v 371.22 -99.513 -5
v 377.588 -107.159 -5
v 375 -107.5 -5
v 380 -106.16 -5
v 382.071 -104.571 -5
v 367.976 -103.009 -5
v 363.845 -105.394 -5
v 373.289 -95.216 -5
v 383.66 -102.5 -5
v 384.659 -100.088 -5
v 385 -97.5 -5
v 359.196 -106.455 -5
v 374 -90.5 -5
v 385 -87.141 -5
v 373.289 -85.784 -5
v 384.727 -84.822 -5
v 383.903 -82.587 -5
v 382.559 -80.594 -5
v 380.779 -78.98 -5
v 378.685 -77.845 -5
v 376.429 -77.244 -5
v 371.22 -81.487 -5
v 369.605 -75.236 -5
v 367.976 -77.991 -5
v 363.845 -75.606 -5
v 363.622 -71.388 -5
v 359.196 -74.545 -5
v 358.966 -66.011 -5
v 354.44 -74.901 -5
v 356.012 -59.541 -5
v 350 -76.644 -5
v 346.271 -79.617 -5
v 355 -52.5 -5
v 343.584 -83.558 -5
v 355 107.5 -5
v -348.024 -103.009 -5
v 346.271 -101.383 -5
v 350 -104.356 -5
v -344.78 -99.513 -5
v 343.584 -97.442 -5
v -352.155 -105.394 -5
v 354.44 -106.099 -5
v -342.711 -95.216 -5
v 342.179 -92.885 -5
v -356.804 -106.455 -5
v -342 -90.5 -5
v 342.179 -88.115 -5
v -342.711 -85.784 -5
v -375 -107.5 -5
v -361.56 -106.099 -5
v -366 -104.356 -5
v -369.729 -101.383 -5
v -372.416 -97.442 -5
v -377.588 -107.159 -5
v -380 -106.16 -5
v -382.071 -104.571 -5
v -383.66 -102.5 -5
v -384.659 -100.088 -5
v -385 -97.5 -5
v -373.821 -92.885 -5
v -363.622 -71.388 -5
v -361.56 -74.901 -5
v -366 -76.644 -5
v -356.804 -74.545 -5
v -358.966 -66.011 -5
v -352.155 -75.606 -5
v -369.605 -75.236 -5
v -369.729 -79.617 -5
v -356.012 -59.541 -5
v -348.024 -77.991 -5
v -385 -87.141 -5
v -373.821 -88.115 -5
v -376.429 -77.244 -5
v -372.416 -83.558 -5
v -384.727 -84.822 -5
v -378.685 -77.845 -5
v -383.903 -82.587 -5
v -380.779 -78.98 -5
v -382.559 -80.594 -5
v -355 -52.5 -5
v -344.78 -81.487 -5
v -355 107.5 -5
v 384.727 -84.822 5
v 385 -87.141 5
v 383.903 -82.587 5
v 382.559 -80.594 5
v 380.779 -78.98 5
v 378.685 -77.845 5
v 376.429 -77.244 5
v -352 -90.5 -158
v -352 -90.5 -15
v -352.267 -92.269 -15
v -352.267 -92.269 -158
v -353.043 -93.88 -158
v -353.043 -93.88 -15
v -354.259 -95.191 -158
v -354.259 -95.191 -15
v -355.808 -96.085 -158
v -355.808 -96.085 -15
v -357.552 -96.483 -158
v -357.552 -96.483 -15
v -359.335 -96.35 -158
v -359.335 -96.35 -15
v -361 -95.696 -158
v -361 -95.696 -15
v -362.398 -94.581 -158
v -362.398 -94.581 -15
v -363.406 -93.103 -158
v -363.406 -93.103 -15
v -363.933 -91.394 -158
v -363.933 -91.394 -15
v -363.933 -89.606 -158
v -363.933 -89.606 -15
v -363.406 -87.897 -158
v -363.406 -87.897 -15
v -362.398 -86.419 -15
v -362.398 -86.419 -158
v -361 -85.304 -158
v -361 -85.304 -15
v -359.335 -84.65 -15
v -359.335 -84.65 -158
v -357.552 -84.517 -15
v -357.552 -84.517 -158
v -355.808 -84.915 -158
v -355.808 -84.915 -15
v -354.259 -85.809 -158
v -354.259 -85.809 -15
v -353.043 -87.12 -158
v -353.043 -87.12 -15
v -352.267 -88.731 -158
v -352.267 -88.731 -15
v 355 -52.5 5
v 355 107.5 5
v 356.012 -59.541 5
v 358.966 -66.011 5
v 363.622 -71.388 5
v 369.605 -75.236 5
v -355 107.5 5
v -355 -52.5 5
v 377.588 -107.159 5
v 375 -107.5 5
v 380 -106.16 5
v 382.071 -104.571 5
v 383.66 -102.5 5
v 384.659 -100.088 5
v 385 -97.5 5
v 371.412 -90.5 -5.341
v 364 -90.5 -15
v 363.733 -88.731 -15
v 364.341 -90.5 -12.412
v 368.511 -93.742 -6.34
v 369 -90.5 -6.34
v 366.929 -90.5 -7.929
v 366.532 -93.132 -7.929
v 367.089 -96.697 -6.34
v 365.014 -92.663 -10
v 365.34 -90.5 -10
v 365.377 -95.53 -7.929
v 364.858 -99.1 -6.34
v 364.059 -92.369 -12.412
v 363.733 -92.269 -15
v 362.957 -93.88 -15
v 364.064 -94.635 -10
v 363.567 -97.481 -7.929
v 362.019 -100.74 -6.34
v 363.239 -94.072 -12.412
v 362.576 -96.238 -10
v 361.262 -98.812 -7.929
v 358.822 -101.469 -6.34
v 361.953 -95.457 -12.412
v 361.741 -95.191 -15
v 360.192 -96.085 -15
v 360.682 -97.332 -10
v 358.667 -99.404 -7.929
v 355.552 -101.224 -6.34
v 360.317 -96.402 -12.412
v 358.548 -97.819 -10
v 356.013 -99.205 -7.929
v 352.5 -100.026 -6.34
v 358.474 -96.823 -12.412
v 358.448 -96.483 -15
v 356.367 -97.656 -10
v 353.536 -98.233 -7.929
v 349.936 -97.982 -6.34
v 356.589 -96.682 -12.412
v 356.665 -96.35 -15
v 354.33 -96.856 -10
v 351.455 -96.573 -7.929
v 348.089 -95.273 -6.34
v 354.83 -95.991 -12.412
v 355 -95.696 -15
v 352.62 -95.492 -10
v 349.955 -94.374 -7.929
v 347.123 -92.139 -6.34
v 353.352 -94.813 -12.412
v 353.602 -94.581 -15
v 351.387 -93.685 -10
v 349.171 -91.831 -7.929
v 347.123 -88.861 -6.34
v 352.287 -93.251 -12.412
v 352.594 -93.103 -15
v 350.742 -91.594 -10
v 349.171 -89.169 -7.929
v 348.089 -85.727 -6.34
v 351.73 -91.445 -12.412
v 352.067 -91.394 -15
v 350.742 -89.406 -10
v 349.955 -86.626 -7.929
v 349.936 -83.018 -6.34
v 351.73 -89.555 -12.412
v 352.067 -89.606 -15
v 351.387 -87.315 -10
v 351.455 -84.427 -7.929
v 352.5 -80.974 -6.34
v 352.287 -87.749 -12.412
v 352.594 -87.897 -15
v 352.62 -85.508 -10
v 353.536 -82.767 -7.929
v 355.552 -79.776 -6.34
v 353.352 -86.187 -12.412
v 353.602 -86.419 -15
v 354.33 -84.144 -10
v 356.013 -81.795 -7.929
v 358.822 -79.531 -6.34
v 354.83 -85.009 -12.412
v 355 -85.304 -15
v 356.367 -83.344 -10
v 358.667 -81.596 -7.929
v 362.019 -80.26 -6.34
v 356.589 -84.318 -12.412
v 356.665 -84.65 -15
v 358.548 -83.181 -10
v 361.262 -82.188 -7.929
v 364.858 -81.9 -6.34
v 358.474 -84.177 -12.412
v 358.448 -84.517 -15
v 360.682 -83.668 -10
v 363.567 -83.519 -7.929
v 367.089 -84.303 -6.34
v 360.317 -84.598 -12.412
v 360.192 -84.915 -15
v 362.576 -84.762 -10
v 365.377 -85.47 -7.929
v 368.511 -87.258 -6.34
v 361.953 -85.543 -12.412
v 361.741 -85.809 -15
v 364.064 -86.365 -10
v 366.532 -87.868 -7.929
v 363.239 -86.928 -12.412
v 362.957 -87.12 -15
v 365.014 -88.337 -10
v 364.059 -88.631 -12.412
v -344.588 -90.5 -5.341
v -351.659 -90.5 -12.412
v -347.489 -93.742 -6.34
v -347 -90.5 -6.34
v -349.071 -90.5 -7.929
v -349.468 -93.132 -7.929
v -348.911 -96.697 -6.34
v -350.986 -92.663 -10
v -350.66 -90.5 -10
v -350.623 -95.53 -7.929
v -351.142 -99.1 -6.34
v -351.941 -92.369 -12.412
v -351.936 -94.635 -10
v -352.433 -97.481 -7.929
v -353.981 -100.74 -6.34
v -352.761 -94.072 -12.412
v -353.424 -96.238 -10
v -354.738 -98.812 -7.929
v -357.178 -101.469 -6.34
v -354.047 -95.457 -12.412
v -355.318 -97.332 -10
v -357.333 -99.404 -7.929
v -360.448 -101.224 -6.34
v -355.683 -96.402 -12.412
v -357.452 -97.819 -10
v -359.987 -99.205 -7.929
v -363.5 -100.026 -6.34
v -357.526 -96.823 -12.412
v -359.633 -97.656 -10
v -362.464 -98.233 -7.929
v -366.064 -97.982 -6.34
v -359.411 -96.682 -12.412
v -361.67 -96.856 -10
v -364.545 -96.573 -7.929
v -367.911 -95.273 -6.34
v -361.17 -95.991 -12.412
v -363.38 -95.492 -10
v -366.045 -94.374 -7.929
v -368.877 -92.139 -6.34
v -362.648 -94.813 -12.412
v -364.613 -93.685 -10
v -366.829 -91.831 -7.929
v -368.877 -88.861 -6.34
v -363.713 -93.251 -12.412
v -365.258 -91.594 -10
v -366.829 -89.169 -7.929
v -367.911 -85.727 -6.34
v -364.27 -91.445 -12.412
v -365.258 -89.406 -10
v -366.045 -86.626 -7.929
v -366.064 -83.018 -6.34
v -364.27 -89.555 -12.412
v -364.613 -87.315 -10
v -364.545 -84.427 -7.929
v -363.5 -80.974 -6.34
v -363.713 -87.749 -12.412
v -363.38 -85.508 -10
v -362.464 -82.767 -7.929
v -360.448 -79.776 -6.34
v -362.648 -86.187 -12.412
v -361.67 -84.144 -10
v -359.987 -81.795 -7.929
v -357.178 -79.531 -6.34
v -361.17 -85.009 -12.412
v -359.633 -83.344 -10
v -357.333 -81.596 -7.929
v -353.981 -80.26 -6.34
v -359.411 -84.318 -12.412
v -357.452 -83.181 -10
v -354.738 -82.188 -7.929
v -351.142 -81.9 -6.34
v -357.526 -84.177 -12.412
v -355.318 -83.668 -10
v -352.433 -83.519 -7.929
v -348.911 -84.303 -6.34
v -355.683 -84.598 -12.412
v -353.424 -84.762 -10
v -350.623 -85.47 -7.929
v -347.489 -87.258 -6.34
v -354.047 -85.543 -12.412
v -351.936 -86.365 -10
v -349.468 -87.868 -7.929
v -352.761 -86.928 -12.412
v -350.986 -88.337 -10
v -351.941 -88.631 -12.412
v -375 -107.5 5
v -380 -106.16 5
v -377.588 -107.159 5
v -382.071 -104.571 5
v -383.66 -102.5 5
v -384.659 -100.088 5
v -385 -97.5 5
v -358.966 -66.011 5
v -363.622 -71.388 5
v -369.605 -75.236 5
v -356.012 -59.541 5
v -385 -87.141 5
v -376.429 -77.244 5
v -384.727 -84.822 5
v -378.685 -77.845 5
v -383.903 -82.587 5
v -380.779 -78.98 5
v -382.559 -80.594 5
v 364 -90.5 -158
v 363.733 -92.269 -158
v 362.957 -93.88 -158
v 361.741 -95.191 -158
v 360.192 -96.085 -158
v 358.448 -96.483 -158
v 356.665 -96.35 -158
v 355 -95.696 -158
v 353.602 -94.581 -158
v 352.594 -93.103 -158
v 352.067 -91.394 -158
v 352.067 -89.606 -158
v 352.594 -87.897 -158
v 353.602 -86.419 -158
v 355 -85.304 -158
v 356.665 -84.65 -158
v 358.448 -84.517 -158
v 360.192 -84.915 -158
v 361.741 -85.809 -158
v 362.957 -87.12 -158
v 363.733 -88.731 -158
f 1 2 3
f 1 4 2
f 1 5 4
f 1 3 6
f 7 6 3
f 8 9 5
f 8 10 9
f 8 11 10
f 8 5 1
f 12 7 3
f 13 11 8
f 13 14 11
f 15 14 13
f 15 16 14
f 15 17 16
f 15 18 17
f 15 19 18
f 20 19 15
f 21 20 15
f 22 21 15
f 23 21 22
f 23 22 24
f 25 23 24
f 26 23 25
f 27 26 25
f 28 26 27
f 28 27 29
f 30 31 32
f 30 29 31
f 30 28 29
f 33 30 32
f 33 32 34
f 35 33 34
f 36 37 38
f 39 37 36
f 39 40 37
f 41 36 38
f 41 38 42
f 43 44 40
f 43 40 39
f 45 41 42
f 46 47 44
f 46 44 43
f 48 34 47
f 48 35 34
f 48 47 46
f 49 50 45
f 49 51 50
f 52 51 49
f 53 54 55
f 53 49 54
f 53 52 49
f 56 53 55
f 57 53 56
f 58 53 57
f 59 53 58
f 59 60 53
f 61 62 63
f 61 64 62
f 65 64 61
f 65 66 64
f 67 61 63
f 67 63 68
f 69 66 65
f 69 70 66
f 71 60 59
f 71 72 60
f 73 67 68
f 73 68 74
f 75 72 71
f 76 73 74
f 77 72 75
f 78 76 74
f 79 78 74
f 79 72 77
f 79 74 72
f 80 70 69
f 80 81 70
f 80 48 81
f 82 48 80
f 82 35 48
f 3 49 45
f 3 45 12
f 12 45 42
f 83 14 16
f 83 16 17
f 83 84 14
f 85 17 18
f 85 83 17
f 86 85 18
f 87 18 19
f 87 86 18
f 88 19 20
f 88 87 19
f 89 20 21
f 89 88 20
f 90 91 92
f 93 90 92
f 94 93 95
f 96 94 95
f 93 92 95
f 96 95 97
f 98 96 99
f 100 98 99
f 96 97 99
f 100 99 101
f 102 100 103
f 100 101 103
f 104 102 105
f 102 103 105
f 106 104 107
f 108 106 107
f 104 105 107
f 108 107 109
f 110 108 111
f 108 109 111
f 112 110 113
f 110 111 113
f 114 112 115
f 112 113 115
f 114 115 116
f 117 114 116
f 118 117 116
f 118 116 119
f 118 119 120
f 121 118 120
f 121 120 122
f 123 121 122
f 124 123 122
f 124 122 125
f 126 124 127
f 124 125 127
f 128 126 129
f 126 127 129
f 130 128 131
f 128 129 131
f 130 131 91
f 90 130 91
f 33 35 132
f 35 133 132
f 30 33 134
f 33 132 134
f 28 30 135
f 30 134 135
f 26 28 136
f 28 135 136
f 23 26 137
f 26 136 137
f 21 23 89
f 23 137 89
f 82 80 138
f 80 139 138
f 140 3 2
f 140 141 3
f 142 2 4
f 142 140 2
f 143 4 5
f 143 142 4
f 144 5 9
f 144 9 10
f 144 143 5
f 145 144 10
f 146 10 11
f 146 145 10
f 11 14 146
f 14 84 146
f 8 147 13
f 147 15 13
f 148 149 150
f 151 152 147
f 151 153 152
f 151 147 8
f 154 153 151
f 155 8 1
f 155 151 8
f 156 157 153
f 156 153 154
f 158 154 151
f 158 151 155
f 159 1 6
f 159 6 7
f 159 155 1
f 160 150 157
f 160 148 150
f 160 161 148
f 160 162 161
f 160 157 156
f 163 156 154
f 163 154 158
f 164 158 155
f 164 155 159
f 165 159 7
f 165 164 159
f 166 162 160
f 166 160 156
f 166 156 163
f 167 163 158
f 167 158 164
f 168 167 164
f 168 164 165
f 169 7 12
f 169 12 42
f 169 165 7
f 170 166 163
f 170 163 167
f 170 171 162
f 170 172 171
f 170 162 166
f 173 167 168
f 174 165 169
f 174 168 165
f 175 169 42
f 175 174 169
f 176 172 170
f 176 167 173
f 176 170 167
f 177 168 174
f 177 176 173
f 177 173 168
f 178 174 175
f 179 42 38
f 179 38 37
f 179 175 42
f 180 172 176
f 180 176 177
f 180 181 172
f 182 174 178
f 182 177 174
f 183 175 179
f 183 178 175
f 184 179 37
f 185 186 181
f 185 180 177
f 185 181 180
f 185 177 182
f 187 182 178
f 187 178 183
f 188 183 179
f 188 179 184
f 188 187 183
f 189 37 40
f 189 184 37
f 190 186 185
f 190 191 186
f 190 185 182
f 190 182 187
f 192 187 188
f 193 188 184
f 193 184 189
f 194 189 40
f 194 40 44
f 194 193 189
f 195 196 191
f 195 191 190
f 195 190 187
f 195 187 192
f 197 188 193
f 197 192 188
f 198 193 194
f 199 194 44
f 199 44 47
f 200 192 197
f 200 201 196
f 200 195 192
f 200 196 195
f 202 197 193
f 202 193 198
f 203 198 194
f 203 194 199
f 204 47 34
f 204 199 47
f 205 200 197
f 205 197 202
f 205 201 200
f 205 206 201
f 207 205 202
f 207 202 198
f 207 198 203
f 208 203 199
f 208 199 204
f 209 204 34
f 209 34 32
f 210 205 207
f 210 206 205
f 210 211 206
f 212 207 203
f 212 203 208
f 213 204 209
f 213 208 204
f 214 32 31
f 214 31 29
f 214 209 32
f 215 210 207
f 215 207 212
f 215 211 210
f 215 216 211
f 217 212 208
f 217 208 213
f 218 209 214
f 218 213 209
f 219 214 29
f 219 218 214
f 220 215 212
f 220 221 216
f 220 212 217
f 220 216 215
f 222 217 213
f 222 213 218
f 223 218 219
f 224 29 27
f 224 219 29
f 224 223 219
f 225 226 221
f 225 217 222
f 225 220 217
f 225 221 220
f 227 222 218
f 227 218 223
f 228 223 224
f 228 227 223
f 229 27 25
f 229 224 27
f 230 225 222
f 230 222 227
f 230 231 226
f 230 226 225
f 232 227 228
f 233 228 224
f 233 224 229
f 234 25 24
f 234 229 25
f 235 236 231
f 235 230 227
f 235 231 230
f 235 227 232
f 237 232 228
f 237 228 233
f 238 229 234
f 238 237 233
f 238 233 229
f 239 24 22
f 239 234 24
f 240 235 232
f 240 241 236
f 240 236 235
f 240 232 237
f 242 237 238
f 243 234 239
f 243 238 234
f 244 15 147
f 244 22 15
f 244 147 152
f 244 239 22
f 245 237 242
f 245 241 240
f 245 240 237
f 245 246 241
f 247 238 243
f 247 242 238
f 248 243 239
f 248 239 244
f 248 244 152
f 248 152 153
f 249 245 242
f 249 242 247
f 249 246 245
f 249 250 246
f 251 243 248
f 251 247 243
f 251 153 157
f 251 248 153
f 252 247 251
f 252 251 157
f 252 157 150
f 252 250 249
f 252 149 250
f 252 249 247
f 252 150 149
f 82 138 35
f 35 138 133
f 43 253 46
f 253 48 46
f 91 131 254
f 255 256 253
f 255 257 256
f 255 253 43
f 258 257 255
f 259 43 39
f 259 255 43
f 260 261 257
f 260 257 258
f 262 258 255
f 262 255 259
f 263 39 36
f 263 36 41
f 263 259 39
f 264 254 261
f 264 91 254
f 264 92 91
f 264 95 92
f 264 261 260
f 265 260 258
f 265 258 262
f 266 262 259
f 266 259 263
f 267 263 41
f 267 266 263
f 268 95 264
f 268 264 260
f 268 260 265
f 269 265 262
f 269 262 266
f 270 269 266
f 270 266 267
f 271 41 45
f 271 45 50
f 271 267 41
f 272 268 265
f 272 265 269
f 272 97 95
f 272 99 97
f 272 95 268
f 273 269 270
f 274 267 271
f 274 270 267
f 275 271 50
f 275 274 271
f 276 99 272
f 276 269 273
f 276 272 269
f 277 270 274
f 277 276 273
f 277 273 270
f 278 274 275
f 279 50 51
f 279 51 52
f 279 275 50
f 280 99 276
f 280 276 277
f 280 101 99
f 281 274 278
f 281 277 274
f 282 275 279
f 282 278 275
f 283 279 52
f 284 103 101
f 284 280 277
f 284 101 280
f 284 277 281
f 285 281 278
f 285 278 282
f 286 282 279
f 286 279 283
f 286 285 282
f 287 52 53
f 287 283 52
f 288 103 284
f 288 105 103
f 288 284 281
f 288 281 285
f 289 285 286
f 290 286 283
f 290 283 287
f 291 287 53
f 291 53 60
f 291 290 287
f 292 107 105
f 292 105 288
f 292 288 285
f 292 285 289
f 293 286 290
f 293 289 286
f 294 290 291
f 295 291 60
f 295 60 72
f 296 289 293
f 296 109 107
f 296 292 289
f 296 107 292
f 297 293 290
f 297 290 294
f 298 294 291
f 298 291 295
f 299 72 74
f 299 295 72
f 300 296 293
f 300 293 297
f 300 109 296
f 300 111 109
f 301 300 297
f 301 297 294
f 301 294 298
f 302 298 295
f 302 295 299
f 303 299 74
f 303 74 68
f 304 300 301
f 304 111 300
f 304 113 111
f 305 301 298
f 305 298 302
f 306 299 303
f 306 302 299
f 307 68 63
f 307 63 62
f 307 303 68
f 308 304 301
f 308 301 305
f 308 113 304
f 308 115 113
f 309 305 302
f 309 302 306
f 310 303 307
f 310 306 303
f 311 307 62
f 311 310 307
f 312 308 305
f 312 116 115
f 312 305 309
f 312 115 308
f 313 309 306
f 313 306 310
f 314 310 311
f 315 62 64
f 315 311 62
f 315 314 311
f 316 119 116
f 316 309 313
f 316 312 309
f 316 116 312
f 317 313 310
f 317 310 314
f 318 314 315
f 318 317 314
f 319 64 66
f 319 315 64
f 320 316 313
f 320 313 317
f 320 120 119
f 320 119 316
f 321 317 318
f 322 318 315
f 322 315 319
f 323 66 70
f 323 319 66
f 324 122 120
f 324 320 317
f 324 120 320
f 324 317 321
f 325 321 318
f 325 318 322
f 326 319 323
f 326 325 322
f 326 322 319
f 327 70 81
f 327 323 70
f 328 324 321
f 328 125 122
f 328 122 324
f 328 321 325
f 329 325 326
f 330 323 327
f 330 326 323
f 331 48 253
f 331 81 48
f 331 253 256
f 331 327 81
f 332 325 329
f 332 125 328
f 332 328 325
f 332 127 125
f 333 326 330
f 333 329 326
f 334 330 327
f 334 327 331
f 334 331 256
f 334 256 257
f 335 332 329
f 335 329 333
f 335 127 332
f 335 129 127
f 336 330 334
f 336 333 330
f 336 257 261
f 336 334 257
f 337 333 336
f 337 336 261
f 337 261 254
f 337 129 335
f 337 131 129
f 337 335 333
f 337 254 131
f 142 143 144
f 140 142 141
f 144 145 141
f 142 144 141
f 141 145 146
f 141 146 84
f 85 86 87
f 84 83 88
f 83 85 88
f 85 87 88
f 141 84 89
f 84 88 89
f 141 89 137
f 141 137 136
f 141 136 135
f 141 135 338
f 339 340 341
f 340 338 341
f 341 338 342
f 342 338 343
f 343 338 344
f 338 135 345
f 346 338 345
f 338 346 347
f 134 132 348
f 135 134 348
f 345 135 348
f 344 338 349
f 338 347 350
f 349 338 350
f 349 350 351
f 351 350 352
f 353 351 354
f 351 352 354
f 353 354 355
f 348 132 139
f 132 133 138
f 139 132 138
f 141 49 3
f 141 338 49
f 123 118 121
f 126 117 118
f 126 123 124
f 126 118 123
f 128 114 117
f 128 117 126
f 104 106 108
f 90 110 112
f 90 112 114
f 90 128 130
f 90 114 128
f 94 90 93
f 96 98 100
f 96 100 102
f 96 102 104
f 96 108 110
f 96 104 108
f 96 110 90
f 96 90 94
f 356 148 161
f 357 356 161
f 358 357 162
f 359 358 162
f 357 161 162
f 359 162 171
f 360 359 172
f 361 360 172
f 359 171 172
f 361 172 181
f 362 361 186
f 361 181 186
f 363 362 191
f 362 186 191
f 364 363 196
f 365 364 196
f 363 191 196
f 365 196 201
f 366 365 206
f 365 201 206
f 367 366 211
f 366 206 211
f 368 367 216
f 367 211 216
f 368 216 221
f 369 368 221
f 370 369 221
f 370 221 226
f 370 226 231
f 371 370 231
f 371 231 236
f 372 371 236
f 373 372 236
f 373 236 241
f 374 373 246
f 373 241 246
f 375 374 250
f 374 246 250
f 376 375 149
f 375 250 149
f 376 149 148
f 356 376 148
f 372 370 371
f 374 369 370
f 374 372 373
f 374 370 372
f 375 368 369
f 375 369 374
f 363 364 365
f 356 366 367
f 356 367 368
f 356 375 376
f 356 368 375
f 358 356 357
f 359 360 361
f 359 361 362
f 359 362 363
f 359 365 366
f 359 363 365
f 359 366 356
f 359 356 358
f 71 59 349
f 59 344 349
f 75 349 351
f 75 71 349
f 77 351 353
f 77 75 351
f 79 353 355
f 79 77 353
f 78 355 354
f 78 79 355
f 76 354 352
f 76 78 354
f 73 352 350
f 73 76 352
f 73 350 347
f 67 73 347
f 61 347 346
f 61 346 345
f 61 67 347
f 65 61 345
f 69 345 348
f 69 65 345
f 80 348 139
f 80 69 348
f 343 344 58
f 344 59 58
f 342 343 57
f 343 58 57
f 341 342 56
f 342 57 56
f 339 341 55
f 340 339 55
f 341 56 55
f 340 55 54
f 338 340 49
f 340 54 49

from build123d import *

# Parameters (mm, degrees)
BOSS_EXTRUDE1_DEPTH = 5
FILLET1_R           = 25
SKETCH2_R           = 6
BOSS_EXTRUDE2_DEPTH = 153
FILLET2_R           = 10
FILLET3_R           = 10


with BuildPart() as part:
    # Sketch1 → Boss-Extrude1 (new, symmetric)
    with BuildSketch(Plane.XY):
        Polygon((-355, -107.5), (-385, -107.5), (-385, -77.5), (-355, -77.5), (-355, 107.5), (355, 107.5), (355, -77.5), (385, -77.5), (385, -107.5), (355, -107.5), align=None)
    extrude(amount=BOSS_EXTRUDE1_DEPTH, both=True)

    # Fillet1
    fillet1_edges = [part.edges().sort_by_distance(p)[0] for p in [
        (-355, -77.5, 0),
        (355, -77.5, 0),
    ]]
    fillet(fillet1_edges, radius=FILLET1_R)

    # Sketch2 → Boss-Extrude2 (add)
    with BuildSketch(Plane(origin=(0, 0, -5), x_dir=(-1, 0, 0), z_dir=(0, 0, -1))):
        with Locations(Location((-358, -90.5, 0), (0, 0, 180))):
            Circle(SKETCH2_R)
        with Locations(Location((358, -90.5, 0), (0, 0, 180))):
            Circle(SKETCH2_R)
    extrude(amount=BOSS_EXTRUDE2_DEPTH)

    # Fillet2
    fillet2_edges = [part.edges().sort_by_distance(p)[0] for p in [
        (-385, -107.5, 0),
        (385, -107.5, 0),
        (352, -90.5, -5),
        (-364, -90.5, -5),
    ]]
    fillet(fillet2_edges, radius=FILLET2_R)

    # Fillet3
    fillet3_edges = [part.edges().sort_by_distance(p)[0] for p in [
        (-385, -77.5, 0),
        (385, -77.5, 0),
    ]]
    fillet(fillet3_edges, radius=FILLET3_R)


solid = part.part
